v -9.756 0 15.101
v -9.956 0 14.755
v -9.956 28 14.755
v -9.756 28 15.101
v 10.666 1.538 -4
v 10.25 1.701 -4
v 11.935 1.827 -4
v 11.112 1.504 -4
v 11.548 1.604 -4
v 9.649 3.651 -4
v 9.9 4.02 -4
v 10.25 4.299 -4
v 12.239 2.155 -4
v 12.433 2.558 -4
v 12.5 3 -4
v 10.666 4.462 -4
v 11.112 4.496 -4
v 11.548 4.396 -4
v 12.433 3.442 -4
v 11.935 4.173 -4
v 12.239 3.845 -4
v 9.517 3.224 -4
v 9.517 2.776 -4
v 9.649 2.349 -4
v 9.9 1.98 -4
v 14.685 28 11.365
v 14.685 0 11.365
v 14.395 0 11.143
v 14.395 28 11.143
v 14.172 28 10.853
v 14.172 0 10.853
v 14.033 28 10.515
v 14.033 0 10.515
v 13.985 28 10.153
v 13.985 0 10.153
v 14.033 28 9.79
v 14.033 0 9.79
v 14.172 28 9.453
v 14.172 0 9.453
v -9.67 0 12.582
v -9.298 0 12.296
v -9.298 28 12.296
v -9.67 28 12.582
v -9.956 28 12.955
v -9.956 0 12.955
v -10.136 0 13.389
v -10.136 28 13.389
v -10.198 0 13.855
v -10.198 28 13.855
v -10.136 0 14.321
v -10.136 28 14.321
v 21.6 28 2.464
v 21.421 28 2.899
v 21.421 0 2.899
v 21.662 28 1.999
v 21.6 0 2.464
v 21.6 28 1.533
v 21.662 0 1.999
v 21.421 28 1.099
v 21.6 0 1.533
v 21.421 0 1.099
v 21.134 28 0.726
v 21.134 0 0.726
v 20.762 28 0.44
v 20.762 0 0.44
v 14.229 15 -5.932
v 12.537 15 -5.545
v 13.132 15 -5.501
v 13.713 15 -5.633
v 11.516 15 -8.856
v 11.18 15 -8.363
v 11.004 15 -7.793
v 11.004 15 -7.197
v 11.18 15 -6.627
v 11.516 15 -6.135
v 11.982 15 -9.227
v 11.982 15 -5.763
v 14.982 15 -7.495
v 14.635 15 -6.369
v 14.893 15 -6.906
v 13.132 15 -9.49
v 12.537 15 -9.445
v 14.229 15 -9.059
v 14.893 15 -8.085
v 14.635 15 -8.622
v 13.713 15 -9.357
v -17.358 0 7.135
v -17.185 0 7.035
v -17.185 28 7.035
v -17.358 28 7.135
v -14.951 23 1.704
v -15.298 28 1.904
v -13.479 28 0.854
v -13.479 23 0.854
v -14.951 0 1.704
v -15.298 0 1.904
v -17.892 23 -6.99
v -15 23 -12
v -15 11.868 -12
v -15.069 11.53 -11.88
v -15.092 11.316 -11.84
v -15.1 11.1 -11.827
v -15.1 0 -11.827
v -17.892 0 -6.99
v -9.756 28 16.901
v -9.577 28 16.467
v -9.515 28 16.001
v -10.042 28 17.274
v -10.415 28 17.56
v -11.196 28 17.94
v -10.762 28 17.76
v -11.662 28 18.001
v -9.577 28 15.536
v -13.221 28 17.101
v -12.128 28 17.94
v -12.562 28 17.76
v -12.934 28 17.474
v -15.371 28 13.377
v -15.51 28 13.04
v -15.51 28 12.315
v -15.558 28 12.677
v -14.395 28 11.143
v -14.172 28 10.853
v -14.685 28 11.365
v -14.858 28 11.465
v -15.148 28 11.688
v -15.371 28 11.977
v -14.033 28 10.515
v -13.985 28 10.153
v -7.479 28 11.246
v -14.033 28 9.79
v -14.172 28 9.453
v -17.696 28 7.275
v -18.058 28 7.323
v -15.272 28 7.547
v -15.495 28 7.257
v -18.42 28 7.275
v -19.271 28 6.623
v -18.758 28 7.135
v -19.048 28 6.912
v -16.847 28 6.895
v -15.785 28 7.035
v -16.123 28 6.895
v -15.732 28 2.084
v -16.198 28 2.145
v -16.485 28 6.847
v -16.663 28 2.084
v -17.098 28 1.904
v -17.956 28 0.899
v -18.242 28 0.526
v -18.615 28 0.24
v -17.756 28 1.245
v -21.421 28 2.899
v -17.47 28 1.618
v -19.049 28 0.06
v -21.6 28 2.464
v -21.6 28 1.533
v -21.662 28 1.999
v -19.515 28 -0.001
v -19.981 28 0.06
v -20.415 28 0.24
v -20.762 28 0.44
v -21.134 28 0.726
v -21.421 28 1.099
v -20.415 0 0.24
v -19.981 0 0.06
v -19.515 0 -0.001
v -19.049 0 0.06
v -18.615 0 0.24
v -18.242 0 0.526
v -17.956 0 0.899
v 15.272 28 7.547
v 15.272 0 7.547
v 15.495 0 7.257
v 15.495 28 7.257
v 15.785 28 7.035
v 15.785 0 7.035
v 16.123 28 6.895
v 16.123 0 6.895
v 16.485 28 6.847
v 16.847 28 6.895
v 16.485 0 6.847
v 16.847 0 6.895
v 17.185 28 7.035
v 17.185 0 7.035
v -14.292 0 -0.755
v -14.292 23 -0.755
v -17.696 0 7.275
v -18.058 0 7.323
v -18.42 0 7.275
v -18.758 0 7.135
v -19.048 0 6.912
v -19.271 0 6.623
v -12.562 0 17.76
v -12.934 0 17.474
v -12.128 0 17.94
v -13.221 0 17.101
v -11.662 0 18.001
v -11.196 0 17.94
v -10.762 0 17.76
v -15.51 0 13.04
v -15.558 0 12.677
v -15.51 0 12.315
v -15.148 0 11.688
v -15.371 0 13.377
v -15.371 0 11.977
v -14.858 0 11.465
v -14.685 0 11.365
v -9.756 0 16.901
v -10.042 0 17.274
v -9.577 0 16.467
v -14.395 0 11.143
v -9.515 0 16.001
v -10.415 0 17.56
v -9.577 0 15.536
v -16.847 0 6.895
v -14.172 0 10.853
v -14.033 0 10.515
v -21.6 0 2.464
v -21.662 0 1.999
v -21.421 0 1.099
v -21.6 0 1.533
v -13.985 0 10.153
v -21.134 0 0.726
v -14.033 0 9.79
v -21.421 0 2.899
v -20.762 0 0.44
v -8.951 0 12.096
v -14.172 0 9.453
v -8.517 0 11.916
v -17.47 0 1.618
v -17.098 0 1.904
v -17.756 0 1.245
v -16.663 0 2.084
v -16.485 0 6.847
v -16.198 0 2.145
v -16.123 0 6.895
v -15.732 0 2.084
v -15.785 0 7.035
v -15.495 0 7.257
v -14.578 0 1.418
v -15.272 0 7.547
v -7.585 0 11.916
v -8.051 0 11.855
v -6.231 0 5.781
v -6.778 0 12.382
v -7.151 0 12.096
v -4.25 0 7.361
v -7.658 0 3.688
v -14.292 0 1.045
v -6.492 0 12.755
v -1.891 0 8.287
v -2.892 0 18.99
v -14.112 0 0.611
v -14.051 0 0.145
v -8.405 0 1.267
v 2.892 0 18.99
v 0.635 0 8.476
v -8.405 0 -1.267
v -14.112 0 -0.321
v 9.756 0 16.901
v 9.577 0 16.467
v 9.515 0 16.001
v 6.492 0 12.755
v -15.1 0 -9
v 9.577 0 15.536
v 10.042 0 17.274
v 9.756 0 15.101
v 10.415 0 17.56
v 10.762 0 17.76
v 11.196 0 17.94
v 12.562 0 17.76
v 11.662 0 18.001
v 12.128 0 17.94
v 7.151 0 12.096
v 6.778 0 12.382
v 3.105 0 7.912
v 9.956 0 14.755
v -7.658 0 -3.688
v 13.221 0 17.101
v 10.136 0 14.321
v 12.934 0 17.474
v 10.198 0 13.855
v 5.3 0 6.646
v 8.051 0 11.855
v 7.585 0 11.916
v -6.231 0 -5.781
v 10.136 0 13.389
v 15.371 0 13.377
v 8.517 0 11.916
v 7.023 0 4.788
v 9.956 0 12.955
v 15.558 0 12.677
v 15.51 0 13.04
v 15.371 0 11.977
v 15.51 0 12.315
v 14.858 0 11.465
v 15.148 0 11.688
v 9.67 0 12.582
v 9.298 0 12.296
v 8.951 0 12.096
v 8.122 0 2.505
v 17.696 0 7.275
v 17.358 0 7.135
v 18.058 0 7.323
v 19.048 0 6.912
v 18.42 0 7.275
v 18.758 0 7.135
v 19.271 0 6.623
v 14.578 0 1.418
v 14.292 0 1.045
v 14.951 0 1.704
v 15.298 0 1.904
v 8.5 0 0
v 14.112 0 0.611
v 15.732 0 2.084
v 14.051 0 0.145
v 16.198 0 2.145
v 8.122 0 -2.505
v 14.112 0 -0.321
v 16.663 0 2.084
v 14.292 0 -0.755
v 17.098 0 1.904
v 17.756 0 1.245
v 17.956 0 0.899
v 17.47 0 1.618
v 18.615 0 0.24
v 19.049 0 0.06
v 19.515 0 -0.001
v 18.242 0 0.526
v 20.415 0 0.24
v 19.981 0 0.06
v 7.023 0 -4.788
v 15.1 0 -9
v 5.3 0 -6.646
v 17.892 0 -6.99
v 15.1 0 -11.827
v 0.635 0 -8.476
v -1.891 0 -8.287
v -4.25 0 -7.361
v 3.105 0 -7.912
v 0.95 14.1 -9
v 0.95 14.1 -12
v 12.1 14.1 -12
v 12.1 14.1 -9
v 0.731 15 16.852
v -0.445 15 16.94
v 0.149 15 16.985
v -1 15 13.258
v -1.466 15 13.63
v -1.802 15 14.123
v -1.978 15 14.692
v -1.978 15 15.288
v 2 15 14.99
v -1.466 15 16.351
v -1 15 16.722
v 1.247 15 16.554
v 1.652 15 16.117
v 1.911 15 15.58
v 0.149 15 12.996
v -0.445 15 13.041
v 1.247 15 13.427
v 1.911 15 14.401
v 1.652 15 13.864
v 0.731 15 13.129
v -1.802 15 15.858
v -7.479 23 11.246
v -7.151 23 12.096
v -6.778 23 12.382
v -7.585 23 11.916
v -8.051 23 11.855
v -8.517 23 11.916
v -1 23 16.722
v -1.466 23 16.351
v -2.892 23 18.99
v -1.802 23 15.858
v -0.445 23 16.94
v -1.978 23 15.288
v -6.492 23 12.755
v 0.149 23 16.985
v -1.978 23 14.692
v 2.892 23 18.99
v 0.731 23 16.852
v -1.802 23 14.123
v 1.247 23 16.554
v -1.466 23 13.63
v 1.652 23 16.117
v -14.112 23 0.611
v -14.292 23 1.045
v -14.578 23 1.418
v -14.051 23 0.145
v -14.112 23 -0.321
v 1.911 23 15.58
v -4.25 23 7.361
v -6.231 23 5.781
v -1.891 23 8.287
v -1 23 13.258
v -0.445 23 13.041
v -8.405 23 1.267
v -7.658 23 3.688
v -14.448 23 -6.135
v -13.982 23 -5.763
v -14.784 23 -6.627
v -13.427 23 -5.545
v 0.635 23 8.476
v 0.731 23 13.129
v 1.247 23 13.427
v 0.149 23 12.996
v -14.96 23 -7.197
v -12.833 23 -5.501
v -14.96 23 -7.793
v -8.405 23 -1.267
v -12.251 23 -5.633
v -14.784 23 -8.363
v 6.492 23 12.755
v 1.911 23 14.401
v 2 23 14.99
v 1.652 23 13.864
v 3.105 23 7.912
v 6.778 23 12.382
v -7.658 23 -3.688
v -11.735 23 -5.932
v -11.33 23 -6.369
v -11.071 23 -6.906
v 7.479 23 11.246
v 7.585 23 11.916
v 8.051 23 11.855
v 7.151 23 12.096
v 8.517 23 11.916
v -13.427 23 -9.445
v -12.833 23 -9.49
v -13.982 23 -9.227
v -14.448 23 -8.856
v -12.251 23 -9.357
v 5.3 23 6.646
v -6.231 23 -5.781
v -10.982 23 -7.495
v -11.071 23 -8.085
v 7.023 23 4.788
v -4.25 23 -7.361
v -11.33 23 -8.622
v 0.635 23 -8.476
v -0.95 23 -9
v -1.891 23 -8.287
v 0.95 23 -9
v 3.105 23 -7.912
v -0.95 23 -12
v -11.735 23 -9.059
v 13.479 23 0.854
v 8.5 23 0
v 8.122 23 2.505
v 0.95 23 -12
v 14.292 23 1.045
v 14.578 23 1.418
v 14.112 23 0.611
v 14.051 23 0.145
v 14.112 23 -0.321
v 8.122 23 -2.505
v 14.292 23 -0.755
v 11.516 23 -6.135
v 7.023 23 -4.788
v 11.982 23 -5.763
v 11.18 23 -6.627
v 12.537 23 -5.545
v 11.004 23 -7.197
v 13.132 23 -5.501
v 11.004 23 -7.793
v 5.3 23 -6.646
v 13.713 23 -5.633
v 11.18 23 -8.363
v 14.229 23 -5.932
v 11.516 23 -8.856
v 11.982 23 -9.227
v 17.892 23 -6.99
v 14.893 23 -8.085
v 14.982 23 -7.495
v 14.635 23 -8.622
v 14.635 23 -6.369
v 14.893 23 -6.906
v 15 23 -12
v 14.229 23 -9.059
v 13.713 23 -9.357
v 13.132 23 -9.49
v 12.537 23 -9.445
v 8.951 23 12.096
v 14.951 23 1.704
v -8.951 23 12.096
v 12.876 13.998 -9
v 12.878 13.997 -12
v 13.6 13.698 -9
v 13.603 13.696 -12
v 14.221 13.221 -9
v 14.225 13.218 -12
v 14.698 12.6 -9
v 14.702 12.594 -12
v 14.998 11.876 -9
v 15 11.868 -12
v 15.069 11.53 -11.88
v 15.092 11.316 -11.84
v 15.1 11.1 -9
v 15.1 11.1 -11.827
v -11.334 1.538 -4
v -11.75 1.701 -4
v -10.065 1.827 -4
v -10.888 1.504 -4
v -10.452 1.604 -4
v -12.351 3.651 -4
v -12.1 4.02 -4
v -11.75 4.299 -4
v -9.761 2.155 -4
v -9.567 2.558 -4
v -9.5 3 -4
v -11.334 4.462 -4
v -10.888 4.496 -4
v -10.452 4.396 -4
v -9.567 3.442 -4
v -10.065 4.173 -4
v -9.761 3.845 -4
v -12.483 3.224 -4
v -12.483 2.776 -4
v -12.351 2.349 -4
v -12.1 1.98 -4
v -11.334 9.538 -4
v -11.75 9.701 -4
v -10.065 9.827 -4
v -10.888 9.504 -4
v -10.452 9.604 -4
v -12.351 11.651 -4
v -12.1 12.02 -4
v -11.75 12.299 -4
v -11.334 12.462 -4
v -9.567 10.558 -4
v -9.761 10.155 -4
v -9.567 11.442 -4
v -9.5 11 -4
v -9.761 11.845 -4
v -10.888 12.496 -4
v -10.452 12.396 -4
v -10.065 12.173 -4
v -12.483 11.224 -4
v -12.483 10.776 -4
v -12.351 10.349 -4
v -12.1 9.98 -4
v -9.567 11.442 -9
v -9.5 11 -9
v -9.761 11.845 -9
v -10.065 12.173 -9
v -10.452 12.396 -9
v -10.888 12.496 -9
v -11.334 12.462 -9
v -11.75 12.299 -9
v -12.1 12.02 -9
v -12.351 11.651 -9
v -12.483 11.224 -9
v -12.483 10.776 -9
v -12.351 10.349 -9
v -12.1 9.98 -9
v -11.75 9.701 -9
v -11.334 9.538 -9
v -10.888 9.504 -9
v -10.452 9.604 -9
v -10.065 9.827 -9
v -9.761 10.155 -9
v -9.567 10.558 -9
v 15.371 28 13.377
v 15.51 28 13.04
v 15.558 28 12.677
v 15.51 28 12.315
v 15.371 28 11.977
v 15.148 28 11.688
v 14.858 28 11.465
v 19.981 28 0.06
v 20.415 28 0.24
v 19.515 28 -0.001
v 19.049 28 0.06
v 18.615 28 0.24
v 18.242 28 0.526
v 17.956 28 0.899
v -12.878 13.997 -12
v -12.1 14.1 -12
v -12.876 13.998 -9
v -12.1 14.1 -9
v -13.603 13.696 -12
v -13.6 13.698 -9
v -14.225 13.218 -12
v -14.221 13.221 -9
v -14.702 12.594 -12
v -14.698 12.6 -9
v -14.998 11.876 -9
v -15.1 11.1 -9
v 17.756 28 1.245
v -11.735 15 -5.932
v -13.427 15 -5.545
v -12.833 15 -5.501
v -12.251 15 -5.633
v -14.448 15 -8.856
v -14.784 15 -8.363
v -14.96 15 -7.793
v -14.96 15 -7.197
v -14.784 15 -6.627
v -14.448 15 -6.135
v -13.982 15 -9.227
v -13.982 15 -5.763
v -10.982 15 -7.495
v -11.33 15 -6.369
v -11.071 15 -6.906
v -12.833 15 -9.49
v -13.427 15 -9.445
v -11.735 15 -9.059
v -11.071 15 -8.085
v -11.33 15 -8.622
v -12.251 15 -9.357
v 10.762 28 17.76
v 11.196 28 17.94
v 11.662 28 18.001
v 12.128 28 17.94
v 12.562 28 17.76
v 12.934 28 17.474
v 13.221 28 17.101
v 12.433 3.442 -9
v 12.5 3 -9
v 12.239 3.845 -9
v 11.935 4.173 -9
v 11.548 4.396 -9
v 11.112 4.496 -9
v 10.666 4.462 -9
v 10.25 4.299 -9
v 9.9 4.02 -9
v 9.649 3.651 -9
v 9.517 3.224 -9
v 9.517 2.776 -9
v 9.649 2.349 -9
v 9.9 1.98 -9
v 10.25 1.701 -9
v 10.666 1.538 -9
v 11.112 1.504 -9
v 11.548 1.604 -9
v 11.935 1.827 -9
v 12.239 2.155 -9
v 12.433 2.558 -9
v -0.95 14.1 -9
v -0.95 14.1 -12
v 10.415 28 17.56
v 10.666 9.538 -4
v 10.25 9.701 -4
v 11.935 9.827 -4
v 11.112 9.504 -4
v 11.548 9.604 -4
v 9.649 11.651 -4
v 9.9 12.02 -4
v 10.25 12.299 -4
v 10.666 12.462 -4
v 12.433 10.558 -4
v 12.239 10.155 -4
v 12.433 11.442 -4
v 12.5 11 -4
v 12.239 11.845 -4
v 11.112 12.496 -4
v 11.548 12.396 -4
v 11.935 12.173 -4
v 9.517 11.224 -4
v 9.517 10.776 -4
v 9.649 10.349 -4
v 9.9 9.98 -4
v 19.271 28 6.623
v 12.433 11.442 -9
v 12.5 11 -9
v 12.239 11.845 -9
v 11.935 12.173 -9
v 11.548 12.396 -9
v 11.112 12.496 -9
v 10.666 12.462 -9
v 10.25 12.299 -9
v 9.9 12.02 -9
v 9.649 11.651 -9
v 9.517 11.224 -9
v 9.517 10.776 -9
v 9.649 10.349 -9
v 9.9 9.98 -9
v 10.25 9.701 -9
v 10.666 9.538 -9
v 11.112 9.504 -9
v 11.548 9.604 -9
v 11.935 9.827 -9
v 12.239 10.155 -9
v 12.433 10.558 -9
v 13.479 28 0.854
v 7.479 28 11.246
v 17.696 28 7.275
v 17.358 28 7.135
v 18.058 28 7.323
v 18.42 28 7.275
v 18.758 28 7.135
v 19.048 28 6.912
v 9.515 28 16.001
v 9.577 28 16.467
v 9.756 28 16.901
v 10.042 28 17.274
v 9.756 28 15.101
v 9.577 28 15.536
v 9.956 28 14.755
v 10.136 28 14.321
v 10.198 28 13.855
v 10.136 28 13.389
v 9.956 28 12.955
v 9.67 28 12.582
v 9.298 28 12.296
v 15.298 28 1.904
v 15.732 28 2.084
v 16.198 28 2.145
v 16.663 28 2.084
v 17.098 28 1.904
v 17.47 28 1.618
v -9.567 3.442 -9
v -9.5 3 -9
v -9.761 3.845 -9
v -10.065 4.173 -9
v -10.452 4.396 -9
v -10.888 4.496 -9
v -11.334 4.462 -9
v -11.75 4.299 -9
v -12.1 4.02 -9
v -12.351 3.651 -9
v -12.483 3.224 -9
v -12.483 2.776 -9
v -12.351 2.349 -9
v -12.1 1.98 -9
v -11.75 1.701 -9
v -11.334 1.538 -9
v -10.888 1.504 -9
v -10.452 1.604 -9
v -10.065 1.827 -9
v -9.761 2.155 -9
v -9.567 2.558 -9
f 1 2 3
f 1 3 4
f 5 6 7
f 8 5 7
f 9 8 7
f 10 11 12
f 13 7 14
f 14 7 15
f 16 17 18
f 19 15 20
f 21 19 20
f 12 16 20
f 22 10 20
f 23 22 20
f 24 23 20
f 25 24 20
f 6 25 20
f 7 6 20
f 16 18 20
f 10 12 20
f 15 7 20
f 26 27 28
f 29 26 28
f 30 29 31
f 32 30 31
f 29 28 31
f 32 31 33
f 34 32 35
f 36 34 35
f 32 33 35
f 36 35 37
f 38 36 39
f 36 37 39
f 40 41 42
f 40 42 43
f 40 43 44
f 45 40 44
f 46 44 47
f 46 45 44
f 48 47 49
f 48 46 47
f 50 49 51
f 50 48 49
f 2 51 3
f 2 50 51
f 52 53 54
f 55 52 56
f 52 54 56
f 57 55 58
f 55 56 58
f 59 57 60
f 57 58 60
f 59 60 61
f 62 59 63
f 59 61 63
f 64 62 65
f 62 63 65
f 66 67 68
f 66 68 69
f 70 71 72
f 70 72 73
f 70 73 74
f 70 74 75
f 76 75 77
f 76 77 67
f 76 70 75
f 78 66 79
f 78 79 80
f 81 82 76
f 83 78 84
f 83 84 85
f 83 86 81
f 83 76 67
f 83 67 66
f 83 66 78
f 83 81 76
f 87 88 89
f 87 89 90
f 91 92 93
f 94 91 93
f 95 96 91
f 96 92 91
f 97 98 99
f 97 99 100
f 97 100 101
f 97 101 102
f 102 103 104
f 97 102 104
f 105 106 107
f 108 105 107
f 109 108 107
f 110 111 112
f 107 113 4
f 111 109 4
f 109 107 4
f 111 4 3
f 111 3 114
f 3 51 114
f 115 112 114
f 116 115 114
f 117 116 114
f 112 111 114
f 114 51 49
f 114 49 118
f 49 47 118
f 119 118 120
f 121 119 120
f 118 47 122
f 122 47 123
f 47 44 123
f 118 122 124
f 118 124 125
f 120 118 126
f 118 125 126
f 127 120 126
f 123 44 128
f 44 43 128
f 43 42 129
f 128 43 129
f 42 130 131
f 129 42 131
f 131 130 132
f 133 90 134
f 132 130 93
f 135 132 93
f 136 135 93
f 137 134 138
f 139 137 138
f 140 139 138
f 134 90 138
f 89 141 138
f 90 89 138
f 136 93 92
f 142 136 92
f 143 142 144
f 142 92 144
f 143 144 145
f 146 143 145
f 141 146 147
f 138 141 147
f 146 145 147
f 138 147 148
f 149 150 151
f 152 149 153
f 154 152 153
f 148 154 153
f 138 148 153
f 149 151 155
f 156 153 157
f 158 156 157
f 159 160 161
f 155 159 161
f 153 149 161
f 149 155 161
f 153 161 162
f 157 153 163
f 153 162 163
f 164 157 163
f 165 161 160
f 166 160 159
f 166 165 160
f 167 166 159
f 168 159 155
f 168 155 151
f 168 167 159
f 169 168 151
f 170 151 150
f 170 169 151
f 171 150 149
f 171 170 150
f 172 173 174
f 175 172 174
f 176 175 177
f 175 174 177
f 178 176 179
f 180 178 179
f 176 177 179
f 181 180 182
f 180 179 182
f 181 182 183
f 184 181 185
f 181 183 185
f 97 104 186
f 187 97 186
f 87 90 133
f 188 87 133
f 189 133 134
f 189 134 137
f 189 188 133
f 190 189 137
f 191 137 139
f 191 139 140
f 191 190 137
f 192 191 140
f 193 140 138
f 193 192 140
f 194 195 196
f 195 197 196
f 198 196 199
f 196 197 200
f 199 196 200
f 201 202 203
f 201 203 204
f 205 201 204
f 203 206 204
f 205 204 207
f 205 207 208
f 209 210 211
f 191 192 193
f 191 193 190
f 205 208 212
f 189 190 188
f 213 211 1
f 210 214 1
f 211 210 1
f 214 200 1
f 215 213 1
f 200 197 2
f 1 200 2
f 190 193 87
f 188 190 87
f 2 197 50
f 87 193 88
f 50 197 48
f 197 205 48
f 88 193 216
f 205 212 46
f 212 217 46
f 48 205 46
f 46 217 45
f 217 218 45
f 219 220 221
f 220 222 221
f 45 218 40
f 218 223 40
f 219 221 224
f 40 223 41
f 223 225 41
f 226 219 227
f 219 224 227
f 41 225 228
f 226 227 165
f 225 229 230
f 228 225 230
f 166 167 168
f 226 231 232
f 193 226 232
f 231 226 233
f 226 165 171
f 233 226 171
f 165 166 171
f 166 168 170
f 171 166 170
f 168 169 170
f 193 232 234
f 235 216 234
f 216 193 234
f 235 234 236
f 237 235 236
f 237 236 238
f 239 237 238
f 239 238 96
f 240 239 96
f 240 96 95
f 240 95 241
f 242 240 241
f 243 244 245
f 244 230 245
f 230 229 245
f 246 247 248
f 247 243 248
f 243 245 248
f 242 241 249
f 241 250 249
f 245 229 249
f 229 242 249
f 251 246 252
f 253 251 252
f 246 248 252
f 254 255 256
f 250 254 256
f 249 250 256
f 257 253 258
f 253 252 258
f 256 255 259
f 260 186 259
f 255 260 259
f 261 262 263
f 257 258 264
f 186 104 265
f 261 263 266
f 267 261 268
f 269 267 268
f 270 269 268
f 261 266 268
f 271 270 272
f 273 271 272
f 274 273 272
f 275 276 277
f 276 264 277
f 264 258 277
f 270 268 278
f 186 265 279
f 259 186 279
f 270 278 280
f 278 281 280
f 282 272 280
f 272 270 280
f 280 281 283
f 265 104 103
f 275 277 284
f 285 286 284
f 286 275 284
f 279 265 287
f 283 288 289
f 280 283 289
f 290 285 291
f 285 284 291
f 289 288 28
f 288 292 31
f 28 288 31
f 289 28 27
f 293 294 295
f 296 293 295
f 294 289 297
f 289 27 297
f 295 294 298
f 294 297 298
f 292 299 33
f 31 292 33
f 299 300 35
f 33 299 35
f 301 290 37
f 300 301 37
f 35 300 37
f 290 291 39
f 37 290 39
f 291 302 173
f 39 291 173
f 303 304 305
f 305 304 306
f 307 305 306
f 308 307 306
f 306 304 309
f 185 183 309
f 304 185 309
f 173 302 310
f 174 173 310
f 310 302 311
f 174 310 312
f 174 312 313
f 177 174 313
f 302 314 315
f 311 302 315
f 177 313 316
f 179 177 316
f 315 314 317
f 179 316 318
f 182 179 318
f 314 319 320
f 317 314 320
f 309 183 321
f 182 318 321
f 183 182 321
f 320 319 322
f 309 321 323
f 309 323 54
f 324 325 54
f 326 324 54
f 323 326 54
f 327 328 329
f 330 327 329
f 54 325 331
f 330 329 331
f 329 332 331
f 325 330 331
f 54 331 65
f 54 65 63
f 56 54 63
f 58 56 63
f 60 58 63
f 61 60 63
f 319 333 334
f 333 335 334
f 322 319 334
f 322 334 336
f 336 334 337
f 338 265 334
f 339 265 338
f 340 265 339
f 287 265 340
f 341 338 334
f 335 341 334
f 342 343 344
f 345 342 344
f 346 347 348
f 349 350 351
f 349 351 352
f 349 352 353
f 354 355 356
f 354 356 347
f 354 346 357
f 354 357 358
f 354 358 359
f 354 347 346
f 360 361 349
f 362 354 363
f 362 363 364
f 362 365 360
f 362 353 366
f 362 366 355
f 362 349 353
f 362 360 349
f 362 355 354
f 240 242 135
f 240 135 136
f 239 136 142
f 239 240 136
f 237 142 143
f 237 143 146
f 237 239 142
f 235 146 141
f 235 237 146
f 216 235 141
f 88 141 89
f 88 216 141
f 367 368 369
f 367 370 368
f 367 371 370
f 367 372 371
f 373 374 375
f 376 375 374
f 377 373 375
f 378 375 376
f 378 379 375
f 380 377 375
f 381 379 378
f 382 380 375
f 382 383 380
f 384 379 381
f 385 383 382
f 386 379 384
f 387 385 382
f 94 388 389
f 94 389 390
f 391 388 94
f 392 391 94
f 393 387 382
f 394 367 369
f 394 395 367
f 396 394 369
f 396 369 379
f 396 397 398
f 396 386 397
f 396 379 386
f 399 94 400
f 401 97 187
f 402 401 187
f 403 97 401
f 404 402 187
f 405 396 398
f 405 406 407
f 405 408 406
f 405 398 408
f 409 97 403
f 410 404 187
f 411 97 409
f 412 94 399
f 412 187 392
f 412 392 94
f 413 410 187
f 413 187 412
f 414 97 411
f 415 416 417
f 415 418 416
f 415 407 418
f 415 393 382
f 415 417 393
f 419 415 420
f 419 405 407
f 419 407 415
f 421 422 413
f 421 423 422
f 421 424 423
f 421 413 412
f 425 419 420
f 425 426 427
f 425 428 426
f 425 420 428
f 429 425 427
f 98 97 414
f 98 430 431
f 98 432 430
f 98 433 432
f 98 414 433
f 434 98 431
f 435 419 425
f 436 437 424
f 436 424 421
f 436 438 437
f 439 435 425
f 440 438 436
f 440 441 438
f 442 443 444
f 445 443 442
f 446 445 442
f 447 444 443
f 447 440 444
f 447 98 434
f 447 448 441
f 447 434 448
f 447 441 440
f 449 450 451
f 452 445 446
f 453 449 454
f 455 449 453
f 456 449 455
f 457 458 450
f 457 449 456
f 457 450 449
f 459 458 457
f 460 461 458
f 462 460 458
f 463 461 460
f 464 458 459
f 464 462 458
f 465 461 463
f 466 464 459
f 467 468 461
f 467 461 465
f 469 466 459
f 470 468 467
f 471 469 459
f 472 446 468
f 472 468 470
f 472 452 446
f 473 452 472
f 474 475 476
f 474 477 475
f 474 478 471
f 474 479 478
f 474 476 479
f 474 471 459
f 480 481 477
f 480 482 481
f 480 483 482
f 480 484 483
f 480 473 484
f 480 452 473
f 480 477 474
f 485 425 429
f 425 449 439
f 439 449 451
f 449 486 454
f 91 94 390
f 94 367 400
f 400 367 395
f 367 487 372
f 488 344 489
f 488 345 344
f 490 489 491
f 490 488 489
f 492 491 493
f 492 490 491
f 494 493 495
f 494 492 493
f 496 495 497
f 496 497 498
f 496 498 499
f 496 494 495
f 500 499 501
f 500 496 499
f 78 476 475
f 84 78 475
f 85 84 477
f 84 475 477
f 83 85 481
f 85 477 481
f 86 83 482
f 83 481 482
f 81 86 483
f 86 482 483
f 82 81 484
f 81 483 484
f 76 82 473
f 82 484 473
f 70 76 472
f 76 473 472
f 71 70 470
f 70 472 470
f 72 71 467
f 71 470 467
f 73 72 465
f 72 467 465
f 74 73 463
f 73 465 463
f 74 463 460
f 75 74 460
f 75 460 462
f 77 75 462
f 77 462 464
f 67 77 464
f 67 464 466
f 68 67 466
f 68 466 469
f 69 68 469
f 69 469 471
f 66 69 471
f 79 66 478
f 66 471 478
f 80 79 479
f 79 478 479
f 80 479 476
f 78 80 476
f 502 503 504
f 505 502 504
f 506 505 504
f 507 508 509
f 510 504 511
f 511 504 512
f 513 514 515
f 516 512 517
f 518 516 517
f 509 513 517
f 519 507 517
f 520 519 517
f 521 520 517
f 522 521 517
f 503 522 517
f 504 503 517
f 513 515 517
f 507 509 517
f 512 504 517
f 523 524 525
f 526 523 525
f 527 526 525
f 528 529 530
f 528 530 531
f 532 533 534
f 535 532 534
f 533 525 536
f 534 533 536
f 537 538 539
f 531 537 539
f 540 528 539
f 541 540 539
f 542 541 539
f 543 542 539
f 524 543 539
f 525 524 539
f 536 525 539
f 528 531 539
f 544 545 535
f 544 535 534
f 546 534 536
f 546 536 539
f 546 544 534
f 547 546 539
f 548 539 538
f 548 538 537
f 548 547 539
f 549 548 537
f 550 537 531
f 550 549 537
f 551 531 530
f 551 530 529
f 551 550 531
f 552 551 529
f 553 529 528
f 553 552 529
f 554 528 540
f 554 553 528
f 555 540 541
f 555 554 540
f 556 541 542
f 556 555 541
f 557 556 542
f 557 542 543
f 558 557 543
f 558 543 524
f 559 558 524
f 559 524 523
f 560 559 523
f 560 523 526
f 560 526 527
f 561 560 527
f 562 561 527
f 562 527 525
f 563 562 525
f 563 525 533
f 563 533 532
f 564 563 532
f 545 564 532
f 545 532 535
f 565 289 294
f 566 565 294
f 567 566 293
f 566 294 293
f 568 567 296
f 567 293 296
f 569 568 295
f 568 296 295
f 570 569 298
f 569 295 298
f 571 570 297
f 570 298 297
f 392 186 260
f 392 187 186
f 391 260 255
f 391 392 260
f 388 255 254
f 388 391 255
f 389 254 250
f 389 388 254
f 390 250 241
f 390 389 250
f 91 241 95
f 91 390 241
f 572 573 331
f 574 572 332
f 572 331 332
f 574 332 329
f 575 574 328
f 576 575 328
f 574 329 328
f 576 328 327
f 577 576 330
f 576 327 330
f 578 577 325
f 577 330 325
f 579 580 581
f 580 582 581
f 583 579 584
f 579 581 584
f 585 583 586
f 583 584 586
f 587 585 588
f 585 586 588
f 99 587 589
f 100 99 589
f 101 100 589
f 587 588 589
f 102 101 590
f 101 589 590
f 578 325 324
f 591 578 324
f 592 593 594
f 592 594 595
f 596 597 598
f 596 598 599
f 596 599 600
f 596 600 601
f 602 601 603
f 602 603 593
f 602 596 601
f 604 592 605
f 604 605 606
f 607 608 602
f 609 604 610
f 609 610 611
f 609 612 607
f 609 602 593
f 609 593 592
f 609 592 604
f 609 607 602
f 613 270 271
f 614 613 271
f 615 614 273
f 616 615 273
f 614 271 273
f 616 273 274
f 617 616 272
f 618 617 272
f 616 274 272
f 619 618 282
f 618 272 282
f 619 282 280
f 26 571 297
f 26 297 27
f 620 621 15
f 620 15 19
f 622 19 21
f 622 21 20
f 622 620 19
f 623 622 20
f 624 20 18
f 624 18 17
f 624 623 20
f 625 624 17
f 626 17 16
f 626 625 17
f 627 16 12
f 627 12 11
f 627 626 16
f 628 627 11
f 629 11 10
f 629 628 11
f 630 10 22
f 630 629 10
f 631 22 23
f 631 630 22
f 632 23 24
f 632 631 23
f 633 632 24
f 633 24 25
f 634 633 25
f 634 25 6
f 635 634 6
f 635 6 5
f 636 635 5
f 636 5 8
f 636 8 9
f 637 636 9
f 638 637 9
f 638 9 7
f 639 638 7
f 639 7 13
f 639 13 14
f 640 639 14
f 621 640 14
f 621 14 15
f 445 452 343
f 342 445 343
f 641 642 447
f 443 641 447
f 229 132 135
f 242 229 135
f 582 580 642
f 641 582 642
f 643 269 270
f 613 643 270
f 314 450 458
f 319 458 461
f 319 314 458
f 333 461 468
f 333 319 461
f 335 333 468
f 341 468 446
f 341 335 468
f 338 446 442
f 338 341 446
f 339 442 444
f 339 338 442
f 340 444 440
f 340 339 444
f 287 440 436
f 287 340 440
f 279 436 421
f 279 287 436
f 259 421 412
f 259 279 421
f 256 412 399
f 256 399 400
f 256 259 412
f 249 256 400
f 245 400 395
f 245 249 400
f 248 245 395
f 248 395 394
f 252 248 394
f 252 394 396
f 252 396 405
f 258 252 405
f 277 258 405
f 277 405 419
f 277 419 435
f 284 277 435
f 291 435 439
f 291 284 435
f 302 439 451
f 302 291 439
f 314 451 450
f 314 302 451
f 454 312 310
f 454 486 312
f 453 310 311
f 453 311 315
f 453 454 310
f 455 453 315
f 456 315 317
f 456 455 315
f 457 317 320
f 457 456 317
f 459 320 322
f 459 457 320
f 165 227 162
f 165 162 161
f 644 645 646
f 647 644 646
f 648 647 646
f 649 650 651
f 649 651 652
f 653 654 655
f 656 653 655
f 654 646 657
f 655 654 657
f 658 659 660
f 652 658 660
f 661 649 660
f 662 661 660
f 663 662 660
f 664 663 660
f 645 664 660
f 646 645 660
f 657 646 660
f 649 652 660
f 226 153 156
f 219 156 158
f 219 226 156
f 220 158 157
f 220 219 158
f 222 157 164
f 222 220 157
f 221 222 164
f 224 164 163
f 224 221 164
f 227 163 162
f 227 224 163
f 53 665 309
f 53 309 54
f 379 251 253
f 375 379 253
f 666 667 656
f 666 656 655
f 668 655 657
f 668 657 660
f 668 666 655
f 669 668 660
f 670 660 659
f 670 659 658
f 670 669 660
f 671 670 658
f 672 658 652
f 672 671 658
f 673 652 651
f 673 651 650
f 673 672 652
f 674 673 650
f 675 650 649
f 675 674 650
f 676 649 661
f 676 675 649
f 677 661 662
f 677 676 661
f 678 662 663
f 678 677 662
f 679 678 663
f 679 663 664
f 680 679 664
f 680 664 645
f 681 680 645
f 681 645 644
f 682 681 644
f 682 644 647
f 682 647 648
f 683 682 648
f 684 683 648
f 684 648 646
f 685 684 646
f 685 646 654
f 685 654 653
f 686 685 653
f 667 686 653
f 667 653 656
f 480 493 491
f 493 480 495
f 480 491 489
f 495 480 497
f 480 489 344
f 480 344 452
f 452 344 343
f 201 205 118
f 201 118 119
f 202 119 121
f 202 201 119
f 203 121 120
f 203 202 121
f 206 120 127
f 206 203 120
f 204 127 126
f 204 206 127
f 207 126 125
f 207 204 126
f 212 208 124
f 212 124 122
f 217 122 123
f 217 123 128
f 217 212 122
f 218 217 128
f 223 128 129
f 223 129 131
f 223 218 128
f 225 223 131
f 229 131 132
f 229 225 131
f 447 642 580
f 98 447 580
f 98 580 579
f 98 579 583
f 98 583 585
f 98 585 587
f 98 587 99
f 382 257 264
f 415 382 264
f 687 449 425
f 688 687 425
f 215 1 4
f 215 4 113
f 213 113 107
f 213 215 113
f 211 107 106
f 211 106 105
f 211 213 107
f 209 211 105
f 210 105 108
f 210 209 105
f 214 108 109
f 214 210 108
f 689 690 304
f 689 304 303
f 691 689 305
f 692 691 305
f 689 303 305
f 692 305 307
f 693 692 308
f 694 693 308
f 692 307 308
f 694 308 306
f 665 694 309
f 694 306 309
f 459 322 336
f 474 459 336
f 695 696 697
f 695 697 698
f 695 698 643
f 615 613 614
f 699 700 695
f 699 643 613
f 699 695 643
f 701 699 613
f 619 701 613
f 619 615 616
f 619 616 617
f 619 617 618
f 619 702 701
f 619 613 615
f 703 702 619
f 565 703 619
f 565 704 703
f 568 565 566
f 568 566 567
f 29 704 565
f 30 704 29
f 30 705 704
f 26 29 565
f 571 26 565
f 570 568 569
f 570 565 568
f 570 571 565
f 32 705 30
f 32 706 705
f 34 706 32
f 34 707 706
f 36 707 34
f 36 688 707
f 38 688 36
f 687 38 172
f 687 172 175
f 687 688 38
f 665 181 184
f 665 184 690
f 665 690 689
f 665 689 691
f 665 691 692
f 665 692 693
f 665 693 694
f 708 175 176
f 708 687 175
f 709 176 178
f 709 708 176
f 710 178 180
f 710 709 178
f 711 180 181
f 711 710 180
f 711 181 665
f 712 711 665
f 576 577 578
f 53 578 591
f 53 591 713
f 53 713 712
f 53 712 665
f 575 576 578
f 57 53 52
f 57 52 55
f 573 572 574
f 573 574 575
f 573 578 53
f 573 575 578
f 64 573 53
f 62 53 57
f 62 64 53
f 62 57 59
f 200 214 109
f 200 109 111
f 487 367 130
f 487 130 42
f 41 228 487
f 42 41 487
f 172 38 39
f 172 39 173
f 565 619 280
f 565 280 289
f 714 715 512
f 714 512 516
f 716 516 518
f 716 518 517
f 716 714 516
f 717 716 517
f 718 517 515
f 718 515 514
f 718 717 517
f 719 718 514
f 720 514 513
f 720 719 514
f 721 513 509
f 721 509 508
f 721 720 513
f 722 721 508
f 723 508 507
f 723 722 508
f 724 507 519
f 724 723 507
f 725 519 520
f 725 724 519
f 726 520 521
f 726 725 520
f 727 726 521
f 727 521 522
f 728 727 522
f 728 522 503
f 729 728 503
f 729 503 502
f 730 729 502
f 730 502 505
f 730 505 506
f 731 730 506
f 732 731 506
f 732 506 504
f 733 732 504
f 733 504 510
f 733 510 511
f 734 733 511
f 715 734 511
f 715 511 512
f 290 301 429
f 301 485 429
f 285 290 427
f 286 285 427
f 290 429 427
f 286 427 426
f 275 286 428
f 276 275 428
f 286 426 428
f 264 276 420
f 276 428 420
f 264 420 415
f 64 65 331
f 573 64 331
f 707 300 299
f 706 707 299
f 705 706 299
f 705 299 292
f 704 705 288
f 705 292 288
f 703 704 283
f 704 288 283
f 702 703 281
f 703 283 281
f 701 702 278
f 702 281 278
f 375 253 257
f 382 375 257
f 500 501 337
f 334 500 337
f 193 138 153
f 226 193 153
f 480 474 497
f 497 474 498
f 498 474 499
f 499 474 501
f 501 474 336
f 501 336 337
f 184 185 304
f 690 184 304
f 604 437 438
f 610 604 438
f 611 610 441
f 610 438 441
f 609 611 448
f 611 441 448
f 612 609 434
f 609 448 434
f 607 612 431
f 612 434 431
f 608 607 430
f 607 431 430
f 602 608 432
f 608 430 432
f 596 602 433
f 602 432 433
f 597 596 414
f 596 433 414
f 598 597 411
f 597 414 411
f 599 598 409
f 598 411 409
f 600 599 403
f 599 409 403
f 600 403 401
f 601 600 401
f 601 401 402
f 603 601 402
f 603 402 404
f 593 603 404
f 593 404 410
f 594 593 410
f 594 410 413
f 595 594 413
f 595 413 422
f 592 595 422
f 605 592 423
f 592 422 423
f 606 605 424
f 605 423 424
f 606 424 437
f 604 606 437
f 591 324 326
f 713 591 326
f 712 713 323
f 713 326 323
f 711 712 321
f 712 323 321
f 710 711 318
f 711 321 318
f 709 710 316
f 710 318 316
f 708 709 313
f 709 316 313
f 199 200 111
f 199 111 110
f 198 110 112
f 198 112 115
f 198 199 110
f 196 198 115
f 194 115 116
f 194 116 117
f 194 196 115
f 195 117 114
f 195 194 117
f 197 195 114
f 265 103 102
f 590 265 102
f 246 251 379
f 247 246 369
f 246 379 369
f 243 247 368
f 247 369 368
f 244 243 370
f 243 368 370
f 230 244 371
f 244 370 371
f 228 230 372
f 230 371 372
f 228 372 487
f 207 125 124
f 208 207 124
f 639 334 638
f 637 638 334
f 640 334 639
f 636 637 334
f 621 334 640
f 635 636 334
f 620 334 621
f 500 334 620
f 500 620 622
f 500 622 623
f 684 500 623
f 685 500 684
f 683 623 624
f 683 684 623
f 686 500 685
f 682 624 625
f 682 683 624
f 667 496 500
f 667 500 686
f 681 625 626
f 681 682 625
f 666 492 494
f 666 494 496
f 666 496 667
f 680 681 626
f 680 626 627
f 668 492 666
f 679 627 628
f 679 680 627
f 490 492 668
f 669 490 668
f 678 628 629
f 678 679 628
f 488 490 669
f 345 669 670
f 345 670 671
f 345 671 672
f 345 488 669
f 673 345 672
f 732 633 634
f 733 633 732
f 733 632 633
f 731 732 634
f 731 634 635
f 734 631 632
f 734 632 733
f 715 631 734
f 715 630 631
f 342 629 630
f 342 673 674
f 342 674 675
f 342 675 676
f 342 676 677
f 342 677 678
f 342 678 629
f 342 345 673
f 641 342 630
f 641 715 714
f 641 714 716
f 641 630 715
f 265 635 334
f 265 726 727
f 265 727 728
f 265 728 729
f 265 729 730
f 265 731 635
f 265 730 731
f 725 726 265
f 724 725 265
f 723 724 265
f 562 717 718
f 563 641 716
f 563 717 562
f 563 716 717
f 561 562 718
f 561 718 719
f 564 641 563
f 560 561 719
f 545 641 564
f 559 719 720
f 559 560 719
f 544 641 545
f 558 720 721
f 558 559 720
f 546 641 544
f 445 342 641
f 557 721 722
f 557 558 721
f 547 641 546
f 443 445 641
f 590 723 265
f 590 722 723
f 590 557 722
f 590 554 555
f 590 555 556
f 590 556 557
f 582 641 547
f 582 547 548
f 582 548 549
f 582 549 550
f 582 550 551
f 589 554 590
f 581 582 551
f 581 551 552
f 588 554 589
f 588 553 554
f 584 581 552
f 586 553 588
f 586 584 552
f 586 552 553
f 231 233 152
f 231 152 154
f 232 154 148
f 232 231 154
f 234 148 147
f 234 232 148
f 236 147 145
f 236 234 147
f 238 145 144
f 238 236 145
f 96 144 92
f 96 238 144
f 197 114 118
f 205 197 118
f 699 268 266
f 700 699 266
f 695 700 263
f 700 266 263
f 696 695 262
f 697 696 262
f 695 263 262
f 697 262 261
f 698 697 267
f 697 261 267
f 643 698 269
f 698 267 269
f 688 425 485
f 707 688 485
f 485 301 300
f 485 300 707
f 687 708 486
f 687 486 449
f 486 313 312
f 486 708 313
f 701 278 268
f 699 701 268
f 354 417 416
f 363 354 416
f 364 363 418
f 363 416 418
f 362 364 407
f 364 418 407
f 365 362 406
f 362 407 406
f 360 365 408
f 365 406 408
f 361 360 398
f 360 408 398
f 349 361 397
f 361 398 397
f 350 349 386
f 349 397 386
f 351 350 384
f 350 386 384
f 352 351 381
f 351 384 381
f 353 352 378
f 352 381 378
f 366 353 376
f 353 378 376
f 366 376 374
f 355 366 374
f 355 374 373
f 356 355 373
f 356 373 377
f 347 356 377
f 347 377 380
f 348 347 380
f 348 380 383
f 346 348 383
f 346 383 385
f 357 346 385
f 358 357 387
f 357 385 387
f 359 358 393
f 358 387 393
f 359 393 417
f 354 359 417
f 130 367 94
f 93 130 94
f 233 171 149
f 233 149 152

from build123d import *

# Parameters (mm, degrees)
ESQUISSE2_R                  = 8.5
BOSS_EXTRU_1_DEPTH           = 23
ENL_V_START                  = 23
ESQUISSE3_R                  = 2
ENL_V_MAT_EXTRU_3_DEPTH      = 24
ENL_V_MAT_EXTRU_3_DEPTH_BACK = 8
ENL_V_START_2                = -12
ESQUISSE4_R                  = 1.5
ENL_V_MAT_EXTRU_4_DEPTH      = 8
BOSS_EXTRU_2_DEPTH           = 28
CONG_5_R                     = 1.8
ENL_V_MAT_EXTRU_5_DEPTH      = 5
ESQUISSE7_R                  = 1.5
ESQUISSE7_W                  = 1.9
ESQUISSE7_H                  = 0.1
ENL_V_MAT_EXTRU_6_DEPTH      = 3
CONG_6_R                     = 3


with BuildPart() as part:
    # Esquisse2 → Boss.-Extru.1 (new body)
    with BuildSketch(Plane(origin=(0, 0, 0), x_dir=(1, 0, 0), z_dir=(0, 1, 0))):
        Polygon((15, 12), (-15, 12), (-17.892304845, 6.990381057), (-2.892304845, -18.990381057), (2.892304845, -18.990381057), (17.892304845, 6.990381057), align=None)
        Circle(ESQUISSE2_R, mode=Mode.SUBTRACT)
    extrude(amount=BOSS_EXTRU_1_DEPTH)

    # Esquisse3 → Enlèv. mat.-Extru.3 (cut, two sides)
    with BuildSketch(Plane(origin=(0, 0, 0), x_dir=(1, 0, 0), z_dir=(0, 1, 0)).offset(ENL_V_START)) as enl_v_mat_extru_3_sk:
        with Locations((-12.982050808, 7.495190528)):
            Circle(ESQUISSE3_R)
        with Locations((12.982050808, 7.495190528)):
            Circle(ESQUISSE3_R)
        with Locations((0, -14.990381057)):
            Circle(ESQUISSE3_R)
    extrude(amount=ENL_V_MAT_EXTRU_3_DEPTH, mode=Mode.SUBTRACT)
    extrude(enl_v_mat_extru_3_sk.sketch, amount=-ENL_V_MAT_EXTRU_3_DEPTH_BACK, mode=Mode.SUBTRACT)

    # Esquisse4 → Enlèv. mat.-Extru.4 (cut)
    with BuildSketch(Plane.XY.offset(ENL_V_START_2)):
        with Locations((-11, 11)):
            Circle(ESQUISSE4_R)
        with Locations((11, 11)):
            Circle(ESQUISSE4_R)
        with Locations((11, 3)):
            Circle(ESQUISSE4_R)
        with Locations((-11, 3)):
            Circle(ESQUISSE4_R)
    extrude(amount=ENL_V_MAT_EXTRU_4_DEPTH, mode=Mode.SUBTRACT)

    # Esquisse5 → Boss.-Extru.2 (add)
    with BuildSketch(Plane(origin=(0, 0, 0), x_dir=(1, 0, 0), z_dir=(0, 1, 0))):
        with BuildLine():
            Line((13.220508076, -17.101408311), (15.370508076, -13.377499075))
            ThreePointArc((15.370508076, -13.377499075), (15.510368667, -12.315152412), (14.85807251, -11.465063509))
            Line((14.85807251, -11.465063509), (14.68486743, -11.365063509))
            ThreePointArc((14.68486743, -11.365063509), (14.032571273, -10.514974607), (14.172431864, -9.452627944))
            Line((14.172431864, -9.452627944), (15.272431864, -7.547372056))
            ThreePointArc((15.272431864, -7.547372056), (16.122520766, -6.895075899), (17.18486743, -7.034936491))
            Line((17.18486743, -7.034936491), (17.35807251, -7.134936491))
            ThreePointArc((17.35807251, -7.134936491), (18.420419174, -7.274797082), (19.270508076, -6.622500925))
            Line((19.270508076, -6.622500925), (21.420508076, -2.898591689))
            ThreePointArc((21.420508076, -2.898591689), (21.600328836, -1.532717408), (20.761662349, -0.439745962))
            Line((20.761662349, -0.439745962), (20.415252187, -0.239745962))
            ThreePointArc((20.415252187, -0.239745962), (19.049377906, -0.059925202), (17.956406461, -0.898591689))
            Line((17.956406461, -0.898591689), (17.756406461, -1.24500185))
            ThreePointArc((17.756406461, -1.24500185), (16.663435015, -2.083668338), (15.297560734, -1.903847577))
            Line((15.297560734, -1.903847577), (13.392304845, -0.803847577))
            Line((13.392304845, -0.803847577), (7.392304845, -11.196152423))
            Line((7.392304845, -11.196152423), (9.297560734, -12.296152423))
            ThreePointArc((9.297560734, -12.296152423), (10.136227221, -13.389123868), (9.956406461, -14.75499815))
            Line((9.956406461, -14.75499815), (9.756406461, -15.101408311))
            ThreePointArc((9.756406461, -15.101408311), (9.5765857, -16.467282592), (10.415252187, -17.560254038))
            Line((10.415252187, -17.560254038), (10.761662349, -17.760254038))
            ThreePointArc((10.761662349, -17.760254038), (12.12753663, -17.940074798), (13.220508076, -17.101408311))
        make_face()
        with BuildLine():
            Line((-19.270508076, -6.622500925), (-21.420508076, -2.898591689))
            ThreePointArc((-21.420508076, -2.898591689), (-21.600328836, -1.532717408), (-20.761662349, -0.439745962))
            Line((-20.761662349, -0.439745962), (-20.415252187, -0.239745962))
            ThreePointArc((-20.415252187, -0.239745962), (-19.049377906, -0.059925202), (-17.956406461, -0.898591689))
            Line((-17.956406461, -0.898591689), (-17.756406461, -1.24500185))
            ThreePointArc((-17.756406461, -1.24500185), (-16.663435015, -2.083668338), (-15.297560734, -1.903847577))
            Line((-15.297560734, -1.903847577), (-13.392304845, -0.803847577))
            Line((-13.392304845, -0.803847577), (-7.392304845, -11.196152423))
            Line((-7.392304845, -11.196152423), (-9.297560734, -12.296152423))
            ThreePointArc((-9.297560734, -12.296152423), (-10.136227221, -13.389123868), (-9.956406461, -14.75499815))
            Line((-9.956406461, -14.75499815), (-9.756406461, -15.101408311))
            ThreePointArc((-9.756406461, -15.101408311), (-9.5765857, -16.467282592), (-10.415252187, -17.560254038))
            Line((-10.415252187, -17.560254038), (-10.761662349, -17.760254038))
            ThreePointArc((-10.761662349, -17.760254038), (-12.12753663, -17.940074798), (-13.220508076, -17.101408311))
            Line((-13.220508076, -17.101408311), (-15.370508076, -13.377499075))
            ThreePointArc((-15.370508076, -13.377499075), (-15.510368667, -12.315152412), (-14.85807251, -11.465063509))
            Line((-14.85807251, -11.465063509), (-14.68486743, -11.365063509))
            ThreePointArc((-14.68486743, -11.365063509), (-14.032571273, -10.514974607), (-14.172431864, -9.452627944))
            Line((-14.172431864, -9.452627944), (-15.272431864, -7.547372056))
            ThreePointArc((-15.272431864, -7.547372056), (-16.122520766, -6.895075899), (-17.18486743, -7.034936491))
            Line((-17.18486743, -7.034936491), (-17.35807251, -7.134936491))
            ThreePointArc((-17.35807251, -7.134936491), (-18.420419174, -7.274797082), (-19.270508076, -6.622500925))
        make_face()
    extrude(amount=BOSS_EXTRU_2_DEPTH)

    # Congé5
    cong_5_edges = [part.edges().sort_by_distance(p)[0] for p in [
        (-7.392304845, 11.5, 11.196152423),
        (7.392304845, 11.5, 11.196152423),
        (13.392304845, 11.5, 0.803847577),
        (-13.392304845, 11.5, 0.803847577),
    ]]
    fillet(cong_5_edges, radius=CONG_5_R)

    # Esquisse6 → Enlèv. mat.-Extru.5 (cut)
    with BuildSketch(Plane(origin=(0, 0, 0), x_dir=(1, 0, 0), z_dir=(0, 1, 0)).offset(ENL_V_START)):
        Polygon((-13.392304845, -0.803847577), (-7.392304845, -11.196152423), (-7.478907386, -11.246152423), (-13.478907386, -0.853847577), align=None)
        Polygon((7.392304845, -11.196152423), (13.392304845, -0.803847577), (13.478907386, -0.853847577), (7.478907386, -11.246152423), align=None)
    extrude(amount=ENL_V_MAT_EXTRU_5_DEPTH, mode=Mode.SUBTRACT)

    # Esquisse7 → Enlèv. mat.-Extru.6 (cut)
    with BuildSketch(Plane(origin=(0, 0, -12), x_dir=(-1, 0, 0), z_dir=(0, 0, -1))):
        Polygon((15, 0), (0.85, 0), (-0.85, 0), (-15, 0), (-15, 14.1), (-15.1, 14.1), (-15.1, -0.1), (15.1, -0.1), (15.1, 14.1), (15, 14.1), align=None)
        Polygon((-0.85, 0), (0.85, 0), (15, 0), (15, 14.1), (0.95, 14.1), (0.95, 23), (-0.95, 23), (-0.95, 14.1), (-15, 14.1), (-15, 0), align=None)
        with Locations((-11, 3)):
            Circle(ESQUISSE7_R, mode=Mode.SUBTRACT)
        with Locations((-11, 11)):
            Circle(ESQUISSE7_R, mode=Mode.SUBTRACT)
        with Locations((11, 3)):
            Circle(ESQUISSE7_R, mode=Mode.SUBTRACT)
        with Locations((11, 11)):
            Circle(ESQUISSE7_R, mode=Mode.SUBTRACT)
        with Locations((0, 23.05)):
            Rectangle(ESQUISSE7_W, ESQUISSE7_H)
    extrude(amount=-ENL_V_MAT_EXTRU_6_DEPTH, mode=Mode.SUBTRACT)

    # Congé6
    cong_6_edges = [part.edges().sort_by_distance(p)[0] for p in [
        (-15.1, 14.1, -10.41339746),
        (15.1, 14.1, -10.41339746),
    ]]
    fillet(cong_6_edges, radius=CONG_6_R)


solid = part.part
